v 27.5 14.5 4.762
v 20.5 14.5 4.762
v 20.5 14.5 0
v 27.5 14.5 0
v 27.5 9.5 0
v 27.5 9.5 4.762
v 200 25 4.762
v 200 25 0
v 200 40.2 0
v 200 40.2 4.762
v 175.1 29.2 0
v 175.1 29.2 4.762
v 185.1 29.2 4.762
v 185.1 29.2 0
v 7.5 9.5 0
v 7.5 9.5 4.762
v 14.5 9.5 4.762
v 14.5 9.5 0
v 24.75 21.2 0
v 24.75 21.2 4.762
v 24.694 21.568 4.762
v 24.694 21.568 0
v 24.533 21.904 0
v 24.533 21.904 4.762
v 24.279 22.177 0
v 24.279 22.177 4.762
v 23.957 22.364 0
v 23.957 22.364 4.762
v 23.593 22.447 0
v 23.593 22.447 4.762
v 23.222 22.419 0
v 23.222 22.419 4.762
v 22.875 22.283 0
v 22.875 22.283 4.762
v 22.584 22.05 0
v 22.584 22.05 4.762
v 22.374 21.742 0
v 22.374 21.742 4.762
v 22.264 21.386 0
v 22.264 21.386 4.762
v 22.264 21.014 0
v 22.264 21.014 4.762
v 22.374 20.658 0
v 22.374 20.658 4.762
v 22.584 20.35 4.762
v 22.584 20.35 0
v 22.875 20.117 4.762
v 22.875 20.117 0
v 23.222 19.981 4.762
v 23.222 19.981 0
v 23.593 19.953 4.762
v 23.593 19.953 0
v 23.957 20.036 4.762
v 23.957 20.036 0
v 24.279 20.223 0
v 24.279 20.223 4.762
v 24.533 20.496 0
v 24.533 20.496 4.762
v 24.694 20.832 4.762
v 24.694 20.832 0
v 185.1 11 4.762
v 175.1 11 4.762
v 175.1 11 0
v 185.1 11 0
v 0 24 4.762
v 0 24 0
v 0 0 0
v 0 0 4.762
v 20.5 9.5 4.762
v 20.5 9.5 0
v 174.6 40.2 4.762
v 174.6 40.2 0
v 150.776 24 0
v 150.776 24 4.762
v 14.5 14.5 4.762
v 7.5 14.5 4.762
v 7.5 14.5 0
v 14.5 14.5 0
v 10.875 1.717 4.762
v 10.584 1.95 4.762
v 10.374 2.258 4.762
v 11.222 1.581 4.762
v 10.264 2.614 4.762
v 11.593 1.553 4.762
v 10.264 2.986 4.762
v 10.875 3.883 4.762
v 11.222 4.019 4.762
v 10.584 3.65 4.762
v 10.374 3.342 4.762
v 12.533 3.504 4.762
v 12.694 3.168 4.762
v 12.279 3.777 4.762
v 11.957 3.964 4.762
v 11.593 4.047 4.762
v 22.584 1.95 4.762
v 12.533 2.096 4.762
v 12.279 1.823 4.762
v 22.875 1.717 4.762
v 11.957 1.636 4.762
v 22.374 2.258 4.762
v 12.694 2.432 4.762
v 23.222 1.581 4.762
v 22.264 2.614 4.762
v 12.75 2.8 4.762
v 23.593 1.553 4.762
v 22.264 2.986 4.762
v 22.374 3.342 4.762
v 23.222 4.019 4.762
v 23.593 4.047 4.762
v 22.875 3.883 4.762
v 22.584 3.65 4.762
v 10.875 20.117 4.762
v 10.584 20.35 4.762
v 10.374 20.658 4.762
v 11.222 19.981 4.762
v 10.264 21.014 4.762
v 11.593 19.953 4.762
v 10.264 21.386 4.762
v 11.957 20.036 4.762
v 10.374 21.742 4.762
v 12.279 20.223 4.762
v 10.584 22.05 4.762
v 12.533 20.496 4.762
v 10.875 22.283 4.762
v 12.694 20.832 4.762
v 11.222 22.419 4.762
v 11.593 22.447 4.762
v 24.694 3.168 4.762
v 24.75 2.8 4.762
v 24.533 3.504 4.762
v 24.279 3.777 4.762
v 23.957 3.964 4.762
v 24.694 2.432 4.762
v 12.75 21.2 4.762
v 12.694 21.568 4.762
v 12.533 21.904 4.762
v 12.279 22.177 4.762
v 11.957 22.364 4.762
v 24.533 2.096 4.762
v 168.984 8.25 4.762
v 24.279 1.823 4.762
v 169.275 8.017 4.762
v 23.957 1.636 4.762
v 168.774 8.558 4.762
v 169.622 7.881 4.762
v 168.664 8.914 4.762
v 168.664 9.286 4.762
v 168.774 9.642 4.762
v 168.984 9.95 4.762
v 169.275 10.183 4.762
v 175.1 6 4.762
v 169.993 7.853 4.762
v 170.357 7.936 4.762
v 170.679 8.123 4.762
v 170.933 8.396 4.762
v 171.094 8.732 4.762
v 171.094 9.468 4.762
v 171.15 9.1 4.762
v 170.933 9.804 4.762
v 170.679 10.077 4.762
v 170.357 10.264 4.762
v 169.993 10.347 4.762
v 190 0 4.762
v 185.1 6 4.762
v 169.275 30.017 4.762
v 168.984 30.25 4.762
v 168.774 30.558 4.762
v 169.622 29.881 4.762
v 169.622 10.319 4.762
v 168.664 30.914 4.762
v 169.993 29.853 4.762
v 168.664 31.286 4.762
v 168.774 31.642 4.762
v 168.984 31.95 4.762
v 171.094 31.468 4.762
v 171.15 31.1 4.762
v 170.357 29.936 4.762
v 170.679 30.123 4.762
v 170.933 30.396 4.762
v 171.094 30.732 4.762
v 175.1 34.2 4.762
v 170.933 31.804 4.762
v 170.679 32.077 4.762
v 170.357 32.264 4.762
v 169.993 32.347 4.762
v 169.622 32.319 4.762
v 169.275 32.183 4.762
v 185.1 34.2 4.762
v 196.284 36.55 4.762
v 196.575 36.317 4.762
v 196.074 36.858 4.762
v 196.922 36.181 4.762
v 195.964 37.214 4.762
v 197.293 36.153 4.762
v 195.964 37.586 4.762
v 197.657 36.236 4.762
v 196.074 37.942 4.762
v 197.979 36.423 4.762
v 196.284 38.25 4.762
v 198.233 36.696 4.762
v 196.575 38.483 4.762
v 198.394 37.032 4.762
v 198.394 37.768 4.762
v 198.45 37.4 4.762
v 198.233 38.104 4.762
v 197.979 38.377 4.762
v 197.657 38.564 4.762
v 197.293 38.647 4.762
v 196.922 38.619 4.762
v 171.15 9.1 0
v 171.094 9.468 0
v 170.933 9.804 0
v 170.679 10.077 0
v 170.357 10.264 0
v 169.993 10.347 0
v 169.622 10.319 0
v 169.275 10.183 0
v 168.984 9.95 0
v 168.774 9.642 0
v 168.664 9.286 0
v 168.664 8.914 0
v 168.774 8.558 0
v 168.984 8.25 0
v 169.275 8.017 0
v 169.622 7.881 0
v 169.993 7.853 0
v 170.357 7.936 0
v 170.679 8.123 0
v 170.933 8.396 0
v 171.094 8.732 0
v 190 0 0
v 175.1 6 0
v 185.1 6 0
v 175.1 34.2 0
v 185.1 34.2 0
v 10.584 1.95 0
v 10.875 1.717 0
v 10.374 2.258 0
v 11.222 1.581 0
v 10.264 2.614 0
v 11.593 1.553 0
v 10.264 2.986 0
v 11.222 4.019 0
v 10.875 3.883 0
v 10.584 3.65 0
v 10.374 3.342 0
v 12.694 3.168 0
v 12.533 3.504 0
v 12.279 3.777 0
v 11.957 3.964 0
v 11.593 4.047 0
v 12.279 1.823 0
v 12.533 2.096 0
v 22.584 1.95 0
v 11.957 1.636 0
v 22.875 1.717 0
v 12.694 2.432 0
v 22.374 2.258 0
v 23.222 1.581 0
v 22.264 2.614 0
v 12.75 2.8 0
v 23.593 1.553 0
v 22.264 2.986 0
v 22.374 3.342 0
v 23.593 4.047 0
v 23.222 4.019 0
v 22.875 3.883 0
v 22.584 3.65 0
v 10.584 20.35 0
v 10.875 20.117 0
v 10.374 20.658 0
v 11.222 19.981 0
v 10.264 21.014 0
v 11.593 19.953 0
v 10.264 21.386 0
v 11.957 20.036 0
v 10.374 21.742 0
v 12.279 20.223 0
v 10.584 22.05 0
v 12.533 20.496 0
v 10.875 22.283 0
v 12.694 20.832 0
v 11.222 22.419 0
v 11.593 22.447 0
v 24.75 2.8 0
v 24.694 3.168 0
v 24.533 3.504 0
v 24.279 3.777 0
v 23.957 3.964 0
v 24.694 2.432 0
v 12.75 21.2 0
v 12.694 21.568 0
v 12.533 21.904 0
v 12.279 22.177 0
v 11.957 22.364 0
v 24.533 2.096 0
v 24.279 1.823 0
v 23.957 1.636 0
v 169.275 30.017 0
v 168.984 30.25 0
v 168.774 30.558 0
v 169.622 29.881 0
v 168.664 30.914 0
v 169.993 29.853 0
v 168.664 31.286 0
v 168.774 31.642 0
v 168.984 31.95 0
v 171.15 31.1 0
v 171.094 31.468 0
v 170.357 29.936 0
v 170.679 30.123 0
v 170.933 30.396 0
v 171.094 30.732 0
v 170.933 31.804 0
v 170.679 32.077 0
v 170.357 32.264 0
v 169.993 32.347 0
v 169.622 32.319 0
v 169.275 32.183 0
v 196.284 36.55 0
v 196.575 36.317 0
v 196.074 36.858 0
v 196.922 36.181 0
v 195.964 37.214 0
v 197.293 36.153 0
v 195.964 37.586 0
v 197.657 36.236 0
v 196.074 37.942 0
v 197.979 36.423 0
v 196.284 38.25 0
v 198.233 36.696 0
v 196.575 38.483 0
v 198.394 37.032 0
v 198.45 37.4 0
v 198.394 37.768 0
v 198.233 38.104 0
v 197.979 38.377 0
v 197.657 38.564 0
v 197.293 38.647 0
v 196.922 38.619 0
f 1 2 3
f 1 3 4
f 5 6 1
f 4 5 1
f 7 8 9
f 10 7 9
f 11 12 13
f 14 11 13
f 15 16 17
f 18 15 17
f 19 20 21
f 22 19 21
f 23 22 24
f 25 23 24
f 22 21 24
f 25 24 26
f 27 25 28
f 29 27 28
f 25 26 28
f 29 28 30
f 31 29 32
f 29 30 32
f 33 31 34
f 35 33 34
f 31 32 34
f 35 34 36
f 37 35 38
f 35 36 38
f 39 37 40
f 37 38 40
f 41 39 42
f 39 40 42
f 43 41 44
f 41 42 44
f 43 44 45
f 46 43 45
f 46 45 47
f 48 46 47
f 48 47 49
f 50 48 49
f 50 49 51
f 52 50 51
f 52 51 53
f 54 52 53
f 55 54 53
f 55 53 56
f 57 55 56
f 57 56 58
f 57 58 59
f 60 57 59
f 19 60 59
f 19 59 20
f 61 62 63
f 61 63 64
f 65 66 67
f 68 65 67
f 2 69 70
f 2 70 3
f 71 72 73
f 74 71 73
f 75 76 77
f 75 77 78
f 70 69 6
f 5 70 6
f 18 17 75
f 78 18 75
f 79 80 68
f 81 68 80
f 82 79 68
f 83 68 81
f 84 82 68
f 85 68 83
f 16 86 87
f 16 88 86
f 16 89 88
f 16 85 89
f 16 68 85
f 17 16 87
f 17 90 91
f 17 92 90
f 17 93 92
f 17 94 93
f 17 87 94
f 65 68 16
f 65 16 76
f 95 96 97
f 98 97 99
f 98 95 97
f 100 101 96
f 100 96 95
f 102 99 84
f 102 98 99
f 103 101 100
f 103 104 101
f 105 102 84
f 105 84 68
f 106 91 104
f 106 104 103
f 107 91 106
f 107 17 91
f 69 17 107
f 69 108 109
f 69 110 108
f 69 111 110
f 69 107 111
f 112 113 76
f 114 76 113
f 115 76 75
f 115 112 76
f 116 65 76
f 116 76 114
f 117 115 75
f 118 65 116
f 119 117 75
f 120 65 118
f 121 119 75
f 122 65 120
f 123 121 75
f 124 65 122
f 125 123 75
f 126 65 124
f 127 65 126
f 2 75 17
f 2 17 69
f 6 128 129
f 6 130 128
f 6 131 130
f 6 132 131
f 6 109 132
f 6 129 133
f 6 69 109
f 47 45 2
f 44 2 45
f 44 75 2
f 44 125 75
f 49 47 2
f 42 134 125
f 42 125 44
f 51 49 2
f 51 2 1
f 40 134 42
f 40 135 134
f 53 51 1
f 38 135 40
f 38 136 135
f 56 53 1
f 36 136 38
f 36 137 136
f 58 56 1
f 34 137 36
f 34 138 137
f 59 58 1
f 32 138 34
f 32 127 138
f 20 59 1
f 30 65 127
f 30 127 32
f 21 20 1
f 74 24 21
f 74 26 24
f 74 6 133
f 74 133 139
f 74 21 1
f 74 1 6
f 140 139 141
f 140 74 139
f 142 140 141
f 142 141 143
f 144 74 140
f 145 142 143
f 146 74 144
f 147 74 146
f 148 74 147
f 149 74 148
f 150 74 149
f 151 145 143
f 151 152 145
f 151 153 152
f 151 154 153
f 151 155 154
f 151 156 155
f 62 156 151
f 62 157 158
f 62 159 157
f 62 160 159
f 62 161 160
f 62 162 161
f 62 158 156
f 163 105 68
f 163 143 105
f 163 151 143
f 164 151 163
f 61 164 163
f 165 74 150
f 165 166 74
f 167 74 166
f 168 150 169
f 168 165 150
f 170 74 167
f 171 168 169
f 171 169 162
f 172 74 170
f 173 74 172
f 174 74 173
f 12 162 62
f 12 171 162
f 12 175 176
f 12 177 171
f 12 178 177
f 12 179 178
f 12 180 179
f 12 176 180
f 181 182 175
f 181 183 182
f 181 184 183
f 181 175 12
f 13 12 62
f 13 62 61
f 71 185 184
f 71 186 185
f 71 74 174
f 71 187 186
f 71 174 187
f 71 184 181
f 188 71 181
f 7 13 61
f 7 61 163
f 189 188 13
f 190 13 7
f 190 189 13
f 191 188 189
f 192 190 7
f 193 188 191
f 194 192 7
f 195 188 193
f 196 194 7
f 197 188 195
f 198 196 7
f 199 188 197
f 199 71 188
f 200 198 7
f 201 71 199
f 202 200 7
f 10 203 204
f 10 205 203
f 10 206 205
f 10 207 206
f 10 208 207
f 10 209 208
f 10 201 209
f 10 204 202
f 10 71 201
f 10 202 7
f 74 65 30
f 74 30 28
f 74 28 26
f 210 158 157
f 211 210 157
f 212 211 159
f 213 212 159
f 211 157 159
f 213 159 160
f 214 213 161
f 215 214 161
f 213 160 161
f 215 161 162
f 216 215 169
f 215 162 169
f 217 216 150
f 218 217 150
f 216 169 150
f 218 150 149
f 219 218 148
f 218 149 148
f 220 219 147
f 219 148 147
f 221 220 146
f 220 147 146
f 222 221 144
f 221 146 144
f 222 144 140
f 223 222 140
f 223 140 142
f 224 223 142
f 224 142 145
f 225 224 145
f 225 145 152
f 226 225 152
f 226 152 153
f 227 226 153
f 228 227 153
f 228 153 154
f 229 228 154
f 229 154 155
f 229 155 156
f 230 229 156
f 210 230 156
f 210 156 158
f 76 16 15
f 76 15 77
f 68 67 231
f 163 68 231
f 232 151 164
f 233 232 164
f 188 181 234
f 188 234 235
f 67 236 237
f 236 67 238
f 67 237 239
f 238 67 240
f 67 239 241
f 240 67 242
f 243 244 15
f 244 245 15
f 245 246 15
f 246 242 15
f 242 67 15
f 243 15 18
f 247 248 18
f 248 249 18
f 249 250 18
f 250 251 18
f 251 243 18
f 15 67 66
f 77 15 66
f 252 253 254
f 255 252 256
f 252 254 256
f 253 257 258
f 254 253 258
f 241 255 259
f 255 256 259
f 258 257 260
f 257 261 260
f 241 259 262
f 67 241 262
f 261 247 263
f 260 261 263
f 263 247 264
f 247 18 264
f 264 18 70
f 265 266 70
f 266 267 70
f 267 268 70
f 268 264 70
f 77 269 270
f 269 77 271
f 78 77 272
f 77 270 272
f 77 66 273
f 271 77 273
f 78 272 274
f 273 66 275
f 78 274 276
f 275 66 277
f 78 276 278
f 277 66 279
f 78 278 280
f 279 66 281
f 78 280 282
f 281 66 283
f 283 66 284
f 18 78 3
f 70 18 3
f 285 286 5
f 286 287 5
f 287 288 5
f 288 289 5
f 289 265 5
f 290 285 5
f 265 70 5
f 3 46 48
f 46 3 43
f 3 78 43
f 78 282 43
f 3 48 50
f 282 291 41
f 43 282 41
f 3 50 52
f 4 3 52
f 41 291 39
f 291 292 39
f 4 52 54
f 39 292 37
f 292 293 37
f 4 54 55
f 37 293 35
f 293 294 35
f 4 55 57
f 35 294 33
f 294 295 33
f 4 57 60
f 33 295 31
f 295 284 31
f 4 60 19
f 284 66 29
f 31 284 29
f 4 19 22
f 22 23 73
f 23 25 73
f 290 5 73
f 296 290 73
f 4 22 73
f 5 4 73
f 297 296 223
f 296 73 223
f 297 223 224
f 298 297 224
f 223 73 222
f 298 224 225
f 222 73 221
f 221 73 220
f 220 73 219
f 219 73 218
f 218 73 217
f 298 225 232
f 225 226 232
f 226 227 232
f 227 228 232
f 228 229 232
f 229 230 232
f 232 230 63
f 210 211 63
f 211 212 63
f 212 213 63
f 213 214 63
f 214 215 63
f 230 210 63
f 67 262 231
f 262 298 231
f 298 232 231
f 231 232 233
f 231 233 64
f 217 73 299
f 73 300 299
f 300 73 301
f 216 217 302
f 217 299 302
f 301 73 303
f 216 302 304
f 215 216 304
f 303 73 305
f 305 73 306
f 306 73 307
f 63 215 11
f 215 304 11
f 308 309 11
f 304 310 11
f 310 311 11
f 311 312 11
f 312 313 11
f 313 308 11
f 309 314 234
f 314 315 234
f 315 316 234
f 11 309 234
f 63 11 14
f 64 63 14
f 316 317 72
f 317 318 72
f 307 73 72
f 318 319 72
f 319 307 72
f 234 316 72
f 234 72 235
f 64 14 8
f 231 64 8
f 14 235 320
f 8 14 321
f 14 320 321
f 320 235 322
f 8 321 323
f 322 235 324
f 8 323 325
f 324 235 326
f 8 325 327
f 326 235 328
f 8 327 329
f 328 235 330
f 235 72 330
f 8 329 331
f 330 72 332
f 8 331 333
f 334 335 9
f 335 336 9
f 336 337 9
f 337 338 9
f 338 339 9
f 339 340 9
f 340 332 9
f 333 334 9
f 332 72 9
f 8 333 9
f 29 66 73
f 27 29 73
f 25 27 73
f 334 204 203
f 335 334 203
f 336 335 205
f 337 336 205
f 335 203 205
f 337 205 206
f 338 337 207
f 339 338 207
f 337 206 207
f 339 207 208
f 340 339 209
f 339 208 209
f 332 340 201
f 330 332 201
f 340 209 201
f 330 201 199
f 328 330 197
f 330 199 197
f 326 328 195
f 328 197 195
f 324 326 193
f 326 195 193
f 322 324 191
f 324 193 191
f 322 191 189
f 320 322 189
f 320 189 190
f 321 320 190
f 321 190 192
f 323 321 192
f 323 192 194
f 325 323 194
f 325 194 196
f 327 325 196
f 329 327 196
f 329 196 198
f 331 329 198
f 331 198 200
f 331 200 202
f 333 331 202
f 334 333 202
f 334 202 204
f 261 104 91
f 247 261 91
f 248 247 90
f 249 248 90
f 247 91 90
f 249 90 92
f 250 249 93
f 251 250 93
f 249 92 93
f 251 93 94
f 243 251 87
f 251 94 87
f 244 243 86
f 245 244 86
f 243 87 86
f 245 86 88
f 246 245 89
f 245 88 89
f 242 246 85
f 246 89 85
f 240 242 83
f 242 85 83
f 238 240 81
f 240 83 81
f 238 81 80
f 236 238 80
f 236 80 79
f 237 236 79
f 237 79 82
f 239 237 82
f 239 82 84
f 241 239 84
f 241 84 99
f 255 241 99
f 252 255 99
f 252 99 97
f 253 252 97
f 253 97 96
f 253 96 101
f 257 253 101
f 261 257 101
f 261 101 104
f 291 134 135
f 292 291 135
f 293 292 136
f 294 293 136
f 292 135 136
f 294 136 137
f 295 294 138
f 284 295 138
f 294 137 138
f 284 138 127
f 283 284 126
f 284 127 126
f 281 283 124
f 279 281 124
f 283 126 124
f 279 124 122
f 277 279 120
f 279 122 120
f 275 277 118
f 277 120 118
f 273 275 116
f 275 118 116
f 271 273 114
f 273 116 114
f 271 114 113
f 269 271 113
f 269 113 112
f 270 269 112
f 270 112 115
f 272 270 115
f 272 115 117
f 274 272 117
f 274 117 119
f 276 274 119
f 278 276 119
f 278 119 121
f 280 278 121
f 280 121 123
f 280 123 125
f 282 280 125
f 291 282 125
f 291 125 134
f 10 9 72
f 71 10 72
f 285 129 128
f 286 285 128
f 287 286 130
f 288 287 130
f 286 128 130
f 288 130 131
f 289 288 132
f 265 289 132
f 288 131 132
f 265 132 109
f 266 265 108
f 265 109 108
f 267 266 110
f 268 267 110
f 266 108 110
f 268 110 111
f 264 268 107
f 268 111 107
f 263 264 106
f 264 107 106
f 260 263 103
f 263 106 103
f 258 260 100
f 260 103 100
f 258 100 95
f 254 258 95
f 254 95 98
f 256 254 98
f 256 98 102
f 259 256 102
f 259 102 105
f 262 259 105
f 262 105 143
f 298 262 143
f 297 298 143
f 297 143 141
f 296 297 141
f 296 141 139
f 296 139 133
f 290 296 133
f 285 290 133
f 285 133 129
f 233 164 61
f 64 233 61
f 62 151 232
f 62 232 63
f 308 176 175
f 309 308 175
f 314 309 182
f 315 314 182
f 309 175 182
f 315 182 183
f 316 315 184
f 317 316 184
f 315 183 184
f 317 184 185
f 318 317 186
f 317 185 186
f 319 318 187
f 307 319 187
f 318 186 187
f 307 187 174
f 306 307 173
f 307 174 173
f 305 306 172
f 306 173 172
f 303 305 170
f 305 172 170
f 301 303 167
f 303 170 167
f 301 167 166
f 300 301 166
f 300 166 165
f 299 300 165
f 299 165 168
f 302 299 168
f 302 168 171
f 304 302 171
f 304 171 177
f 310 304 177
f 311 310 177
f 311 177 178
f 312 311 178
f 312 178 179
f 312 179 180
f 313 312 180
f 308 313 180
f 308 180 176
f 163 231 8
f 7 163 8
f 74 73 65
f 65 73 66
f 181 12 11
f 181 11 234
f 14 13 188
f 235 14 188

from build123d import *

# Parameters (mm, degrees)
BOSS_EXTRUDE1_DEPTH = 4.7625
SKETCH2_R           = 1.25
SKETCH2_W           = 10
SKETCH2_H           = 5
SKETCH2_W_2         = 7
CUT_EXTRUDE1_DEPTH  = 5.7625


with BuildPart() as part:
    # Sketch1 → Boss-Extrude1 (new body)
    with BuildSketch(Plane.XY):
        Polygon((174.6, 40.2), (150.776470588, 24), (0, 24), (0, 0), (190, 0), (200, 25), (200, 40.2), align=None)
    extrude(amount=BOSS_EXTRUDE1_DEPTH)

    # Sketch2 → Cut-Extrude1 (cut, through all)
    with BuildSketch(Plane.XY.offset(4.7625)):
        with Locations((169.9, 31.1)):
            Circle(SKETCH2_R)
        with Locations((197.2, 37.4)):
            Circle(SKETCH2_R)
        with Locations((169.9, 9.1)):
            Circle(SKETCH2_R)
        with Locations((23.5, 21.2)):
            Circle(SKETCH2_R)
        with Locations((11.5, 21.2)):
            Circle(SKETCH2_R)
        with Locations((11.5, 2.8)):
            Circle(SKETCH2_R)
        with Locations((23.5, 2.8)):
            Circle(SKETCH2_R)
        with Locations((180.1, 31.7)):
            Rectangle(SKETCH2_W, SKETCH2_H)
        with Locations((180.1, 8.5)):
            Rectangle(SKETCH2_W, SKETCH2_H)
        with Locations((11, 12)):
            Rectangle(SKETCH2_W_2, SKETCH2_H)
        with Locations((24, 12)):
            Rectangle(SKETCH2_W_2, SKETCH2_H)
    extrude(amount=-CUT_EXTRUDE1_DEPTH, mode=Mode.SUBTRACT)


solid = part.part
